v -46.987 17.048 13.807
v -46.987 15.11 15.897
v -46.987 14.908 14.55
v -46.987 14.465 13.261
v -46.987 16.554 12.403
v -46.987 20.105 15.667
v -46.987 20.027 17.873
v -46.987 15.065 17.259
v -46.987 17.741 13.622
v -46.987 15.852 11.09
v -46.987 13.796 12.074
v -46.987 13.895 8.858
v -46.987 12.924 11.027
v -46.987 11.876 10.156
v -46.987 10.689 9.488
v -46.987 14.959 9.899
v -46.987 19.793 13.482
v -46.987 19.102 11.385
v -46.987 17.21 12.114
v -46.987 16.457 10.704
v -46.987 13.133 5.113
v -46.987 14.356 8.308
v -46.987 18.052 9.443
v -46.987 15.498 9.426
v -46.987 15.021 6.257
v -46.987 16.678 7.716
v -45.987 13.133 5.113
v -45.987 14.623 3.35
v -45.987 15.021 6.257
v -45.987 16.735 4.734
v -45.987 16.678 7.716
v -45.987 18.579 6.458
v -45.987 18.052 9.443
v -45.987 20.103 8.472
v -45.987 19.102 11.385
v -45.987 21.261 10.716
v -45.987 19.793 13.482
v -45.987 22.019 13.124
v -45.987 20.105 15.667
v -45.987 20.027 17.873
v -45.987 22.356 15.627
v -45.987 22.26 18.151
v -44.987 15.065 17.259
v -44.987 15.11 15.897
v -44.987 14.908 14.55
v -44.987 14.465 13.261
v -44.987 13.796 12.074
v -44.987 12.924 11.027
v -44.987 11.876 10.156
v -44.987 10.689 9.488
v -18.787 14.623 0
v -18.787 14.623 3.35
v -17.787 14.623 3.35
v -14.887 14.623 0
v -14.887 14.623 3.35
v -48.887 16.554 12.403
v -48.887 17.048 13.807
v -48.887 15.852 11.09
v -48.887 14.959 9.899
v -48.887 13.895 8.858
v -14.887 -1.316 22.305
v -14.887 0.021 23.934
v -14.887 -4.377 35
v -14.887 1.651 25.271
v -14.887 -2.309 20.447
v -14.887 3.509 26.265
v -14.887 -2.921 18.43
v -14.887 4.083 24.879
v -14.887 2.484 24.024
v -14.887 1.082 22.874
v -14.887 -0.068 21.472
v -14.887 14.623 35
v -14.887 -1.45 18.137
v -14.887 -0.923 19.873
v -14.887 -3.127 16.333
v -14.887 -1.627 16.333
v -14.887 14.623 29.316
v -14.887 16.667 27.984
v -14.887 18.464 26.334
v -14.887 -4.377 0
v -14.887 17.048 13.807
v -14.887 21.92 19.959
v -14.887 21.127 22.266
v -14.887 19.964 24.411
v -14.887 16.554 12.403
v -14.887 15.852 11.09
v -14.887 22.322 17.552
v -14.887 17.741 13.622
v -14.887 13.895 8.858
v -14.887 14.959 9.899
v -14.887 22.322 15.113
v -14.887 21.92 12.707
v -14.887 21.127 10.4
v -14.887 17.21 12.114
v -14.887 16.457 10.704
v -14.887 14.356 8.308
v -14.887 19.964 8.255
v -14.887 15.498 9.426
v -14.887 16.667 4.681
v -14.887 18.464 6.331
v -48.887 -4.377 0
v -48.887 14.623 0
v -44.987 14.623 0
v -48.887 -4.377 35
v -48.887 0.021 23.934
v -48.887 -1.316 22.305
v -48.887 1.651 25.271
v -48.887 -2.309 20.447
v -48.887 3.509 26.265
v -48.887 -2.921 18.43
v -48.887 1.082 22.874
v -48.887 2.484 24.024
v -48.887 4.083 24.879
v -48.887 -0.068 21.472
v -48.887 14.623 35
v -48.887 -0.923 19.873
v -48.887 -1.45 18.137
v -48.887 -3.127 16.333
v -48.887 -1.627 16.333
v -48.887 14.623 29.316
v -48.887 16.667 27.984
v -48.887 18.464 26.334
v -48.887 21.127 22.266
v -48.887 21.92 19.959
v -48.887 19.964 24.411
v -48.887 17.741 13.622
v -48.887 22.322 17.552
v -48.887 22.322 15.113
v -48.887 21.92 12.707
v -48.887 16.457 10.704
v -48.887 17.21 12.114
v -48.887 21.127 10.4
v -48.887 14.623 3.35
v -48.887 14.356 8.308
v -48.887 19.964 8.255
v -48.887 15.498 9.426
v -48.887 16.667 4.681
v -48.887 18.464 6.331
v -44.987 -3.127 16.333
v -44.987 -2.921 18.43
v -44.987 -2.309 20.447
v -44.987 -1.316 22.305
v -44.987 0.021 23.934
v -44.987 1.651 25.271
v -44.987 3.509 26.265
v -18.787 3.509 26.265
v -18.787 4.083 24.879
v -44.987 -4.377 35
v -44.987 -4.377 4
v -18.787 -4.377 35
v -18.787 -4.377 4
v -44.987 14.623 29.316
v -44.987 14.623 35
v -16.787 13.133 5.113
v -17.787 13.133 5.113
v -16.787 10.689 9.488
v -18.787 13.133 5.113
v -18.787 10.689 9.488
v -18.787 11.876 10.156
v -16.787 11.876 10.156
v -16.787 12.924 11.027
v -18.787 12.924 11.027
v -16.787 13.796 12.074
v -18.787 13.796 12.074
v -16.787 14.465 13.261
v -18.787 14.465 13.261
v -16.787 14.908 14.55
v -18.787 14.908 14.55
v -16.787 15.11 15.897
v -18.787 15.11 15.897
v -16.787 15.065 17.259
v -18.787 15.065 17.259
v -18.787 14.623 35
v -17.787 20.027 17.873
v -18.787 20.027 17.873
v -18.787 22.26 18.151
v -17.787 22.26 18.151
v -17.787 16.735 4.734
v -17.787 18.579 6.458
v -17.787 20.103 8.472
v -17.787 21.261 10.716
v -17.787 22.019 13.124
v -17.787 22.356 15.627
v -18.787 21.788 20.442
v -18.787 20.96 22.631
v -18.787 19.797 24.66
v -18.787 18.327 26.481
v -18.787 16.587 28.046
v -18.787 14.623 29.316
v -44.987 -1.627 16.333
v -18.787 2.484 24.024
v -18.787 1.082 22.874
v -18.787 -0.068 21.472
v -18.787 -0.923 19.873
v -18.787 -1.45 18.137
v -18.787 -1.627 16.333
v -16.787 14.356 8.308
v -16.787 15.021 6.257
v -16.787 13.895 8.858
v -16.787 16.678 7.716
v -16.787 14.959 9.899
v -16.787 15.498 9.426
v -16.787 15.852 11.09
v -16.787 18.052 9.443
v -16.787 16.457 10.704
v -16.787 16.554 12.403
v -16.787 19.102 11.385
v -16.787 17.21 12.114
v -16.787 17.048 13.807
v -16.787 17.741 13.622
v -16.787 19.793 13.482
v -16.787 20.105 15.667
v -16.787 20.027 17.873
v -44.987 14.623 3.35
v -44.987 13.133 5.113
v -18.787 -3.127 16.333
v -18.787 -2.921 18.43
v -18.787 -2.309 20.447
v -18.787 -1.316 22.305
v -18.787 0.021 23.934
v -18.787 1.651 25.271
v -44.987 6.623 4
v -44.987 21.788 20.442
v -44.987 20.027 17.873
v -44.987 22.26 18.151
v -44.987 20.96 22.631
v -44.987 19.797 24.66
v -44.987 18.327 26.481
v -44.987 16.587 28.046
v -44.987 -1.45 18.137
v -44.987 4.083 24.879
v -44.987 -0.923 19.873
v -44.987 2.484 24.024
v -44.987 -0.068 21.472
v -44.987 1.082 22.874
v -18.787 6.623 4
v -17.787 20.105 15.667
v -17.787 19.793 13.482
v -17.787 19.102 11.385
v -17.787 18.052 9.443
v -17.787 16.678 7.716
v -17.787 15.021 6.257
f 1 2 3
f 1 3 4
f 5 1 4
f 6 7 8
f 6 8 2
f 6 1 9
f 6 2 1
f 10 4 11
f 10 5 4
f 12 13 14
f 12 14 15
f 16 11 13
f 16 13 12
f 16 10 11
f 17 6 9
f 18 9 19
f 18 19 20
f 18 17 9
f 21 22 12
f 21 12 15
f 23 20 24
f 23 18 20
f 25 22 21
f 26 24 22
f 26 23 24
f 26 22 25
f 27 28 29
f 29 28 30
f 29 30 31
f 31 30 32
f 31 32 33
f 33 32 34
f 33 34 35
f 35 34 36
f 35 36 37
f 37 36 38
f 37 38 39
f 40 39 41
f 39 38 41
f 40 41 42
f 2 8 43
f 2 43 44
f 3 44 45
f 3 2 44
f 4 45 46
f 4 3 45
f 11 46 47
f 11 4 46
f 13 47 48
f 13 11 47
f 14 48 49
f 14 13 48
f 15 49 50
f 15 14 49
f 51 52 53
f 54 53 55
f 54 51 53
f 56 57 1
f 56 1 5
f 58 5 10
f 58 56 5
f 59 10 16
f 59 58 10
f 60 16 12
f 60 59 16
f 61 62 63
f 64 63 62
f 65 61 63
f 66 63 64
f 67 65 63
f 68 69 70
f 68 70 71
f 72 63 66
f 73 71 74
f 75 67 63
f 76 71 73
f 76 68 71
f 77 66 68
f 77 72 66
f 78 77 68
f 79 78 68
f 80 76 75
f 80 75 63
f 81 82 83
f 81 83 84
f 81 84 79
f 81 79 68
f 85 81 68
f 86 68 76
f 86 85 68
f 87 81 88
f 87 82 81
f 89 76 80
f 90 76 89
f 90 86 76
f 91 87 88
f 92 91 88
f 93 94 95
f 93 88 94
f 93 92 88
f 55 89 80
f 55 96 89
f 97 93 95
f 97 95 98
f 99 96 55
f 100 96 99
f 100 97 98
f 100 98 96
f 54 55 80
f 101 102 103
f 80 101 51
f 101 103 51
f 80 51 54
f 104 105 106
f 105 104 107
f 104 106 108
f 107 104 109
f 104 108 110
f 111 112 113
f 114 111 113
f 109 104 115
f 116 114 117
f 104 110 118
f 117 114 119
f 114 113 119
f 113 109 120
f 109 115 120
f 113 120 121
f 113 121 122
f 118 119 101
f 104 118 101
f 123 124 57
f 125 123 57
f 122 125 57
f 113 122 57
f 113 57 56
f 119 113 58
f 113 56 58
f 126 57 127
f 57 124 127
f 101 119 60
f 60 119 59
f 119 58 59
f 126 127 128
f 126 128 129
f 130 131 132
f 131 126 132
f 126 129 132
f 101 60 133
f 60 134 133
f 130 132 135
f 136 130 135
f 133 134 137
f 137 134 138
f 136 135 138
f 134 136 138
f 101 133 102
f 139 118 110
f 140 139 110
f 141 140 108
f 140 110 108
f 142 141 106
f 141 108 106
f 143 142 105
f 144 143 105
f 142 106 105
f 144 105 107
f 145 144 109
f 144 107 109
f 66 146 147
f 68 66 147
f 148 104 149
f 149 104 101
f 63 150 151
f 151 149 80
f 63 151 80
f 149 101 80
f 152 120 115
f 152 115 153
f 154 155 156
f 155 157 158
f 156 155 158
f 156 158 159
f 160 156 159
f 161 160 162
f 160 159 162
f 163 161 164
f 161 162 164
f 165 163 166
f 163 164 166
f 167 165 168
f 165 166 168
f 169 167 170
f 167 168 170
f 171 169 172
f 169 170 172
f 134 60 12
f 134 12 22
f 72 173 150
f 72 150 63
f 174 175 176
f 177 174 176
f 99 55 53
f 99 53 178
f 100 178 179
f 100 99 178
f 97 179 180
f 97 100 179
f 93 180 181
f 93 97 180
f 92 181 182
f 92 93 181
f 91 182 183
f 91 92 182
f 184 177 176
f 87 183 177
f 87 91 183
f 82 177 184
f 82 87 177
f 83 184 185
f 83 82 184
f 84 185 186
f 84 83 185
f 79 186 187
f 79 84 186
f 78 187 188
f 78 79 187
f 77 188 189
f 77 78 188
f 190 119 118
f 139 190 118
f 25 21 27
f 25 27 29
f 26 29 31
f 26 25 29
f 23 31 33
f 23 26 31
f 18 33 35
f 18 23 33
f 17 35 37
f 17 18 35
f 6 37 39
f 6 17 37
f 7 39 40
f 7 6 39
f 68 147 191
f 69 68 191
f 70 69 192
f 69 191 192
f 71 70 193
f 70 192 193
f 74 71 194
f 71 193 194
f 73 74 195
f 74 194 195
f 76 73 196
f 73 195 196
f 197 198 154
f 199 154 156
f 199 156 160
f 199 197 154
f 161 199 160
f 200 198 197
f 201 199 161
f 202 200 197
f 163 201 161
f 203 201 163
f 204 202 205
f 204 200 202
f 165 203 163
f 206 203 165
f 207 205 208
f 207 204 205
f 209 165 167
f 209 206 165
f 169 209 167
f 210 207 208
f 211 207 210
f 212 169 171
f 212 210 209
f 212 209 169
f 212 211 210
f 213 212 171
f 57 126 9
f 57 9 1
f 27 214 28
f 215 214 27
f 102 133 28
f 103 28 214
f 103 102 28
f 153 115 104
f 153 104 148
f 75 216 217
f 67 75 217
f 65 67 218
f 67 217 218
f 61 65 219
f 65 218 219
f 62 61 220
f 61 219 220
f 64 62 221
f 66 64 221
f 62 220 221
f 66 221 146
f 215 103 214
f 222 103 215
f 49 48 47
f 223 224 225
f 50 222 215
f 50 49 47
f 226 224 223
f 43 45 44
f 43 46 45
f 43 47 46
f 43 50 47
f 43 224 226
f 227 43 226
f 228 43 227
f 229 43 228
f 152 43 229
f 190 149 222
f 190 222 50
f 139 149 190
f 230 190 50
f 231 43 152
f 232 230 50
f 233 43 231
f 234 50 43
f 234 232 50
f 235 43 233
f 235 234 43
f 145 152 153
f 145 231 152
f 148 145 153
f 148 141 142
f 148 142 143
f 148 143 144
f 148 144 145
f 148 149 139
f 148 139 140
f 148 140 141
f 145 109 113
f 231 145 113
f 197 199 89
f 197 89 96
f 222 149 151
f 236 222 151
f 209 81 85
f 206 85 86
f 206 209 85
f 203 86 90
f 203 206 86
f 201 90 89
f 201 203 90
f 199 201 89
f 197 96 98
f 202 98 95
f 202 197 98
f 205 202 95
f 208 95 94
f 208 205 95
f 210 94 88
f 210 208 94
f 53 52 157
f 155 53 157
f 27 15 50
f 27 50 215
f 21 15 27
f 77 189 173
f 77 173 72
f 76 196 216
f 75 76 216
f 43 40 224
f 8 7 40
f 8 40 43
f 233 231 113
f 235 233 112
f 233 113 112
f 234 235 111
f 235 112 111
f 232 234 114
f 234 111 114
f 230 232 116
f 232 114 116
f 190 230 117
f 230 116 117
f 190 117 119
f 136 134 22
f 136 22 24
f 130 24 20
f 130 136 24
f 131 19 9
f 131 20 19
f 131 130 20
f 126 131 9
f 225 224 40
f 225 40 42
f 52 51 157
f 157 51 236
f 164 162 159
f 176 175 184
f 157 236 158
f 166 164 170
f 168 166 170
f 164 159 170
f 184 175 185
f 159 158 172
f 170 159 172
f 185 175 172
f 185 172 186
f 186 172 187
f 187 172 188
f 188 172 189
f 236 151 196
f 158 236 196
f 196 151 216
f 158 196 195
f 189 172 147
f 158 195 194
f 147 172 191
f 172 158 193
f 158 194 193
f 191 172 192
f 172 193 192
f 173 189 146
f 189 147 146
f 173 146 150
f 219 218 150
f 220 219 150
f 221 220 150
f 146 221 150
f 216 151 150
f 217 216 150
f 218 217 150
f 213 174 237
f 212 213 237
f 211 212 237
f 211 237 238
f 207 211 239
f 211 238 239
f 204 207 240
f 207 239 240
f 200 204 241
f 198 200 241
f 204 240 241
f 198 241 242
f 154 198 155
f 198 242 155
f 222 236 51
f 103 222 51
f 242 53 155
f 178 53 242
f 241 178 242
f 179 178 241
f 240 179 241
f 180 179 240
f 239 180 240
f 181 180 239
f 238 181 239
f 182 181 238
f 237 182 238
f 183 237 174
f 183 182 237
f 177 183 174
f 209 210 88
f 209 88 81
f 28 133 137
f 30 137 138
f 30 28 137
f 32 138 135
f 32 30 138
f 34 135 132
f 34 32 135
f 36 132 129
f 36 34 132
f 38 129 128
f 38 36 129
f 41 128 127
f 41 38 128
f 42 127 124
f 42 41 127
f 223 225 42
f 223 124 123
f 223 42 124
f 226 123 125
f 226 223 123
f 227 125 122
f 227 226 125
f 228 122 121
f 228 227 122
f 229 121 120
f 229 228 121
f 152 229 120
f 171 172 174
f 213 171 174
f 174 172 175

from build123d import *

# Parameters (mm, degrees)
CROQUIS1_W              = 34
CROQUIS1_H              = 19
SALIENTE_EXTRUIR1_DEPTH = 35
CROQUIS2_W              = 26.2
CROQUIS2_H              = 31
CORTAR_EXTRUIR1_DEPTH   = 25
CORTAR_EXTRUIR3_DEPTH   = 26.2
SALIENTE_EXTRUIR2_DEPTH = 34
CROQUIS10_W             = 26.2
CROQUIS10_H             = 25.966324345
CORTAR_EXTRUIR4_DEPTH   = 10
CORTAR_EXTRUIR5_START   = -34
CORTAR_EXTRUIR5_DEPTH   = 34
CORTAR_EXTRUIR6_DEPTH   = 2
CORTAR_EXTRUIR7_START   = 28.2
CORTAR_EXTRUIR7_DEPTH   = 28.2
CORTAR_EXTRUIR8_DEPTH   = 1
CORTAR_EXTRUIR9_DEPTH   = 27.2


with BuildPart() as part:
    # Croquis1 → Saliente-Extruir1 (new body)
    with BuildSketch(Plane.XY):
        with Locations((-31.887263086, 5.12254902)):
            Rectangle(CROQUIS1_W, CROQUIS1_H)
    extrude(amount=SALIENTE_EXTRUIR1_DEPTH)

    # Croquis2 → Cortar-Extruir1 (cut)
    with BuildSketch(Plane.XZ.offset(4.37745098)):
        with Locations((-31.887263086, 19.5)):
            Rectangle(CROQUIS2_W, CROQUIS2_H)
    extrude(amount=-CORTAR_EXTRUIR1_DEPTH, mode=Mode.SUBTRACT)

    # Croquis4 → Cortar-Extruir3 (cut)
    with BuildSketch(Plane.ZY.offset(18.787263086)):
        Polygon((4, 14.62254902), (4, 6.62254902), (0, 14.62254902), align=None)
    extrude(amount=CORTAR_EXTRUIR3_DEPTH, mode=Mode.SUBTRACT)

    # Croquis9 → Saliente-Extruir2 (add)
    with BuildSketch(Plane(origin=(-14.887263086, 0, 0), x_dir=(0, 0, -1), z_dir=(1, 0, 0))):
        with BuildLine():
            Line((-29.315831827, 14.62254902), (-3.349507482, 14.62254902))
            ThreePointArc((-3.349507482, 14.62254902), (-16.332669655, 22.37254902), (-29.315831827, 14.62254902))
        make_face()
    extrude(amount=-SALIENTE_EXTRUIR2_DEPTH)

    # Croquis10 → Cortar-Extruir4 (cut)
    with BuildSketch(Plane.XZ.offset(-14.62254902)):
        with Locations((-31.887263086, 16.332669655)):
            Rectangle(CROQUIS10_W, CROQUIS10_H)
    extrude(amount=-CORTAR_EXTRUIR4_DEPTH, mode=Mode.SUBTRACT)

    # Croquis11 → Cortar-Extruir5 (cut)
    with BuildSketch(Plane(origin=(-14.887263086, 0, 0), x_dir=(0, 0, -1), z_dir=(1, 0, 0)).offset(CORTAR_EXTRUIR5_START)):
        with BuildLine():
            Line((-26.264575199, 3.509186373), (-24.878727914, 4.083143951))
            ThreePointArc((-24.878727914, 4.083143951), (-21.471881808, -0.068419609), (-16.332669655, -1.62745098))
            Line((-16.332669655, -1.62745098), (-16.332669655, -3.12745098))
            ThreePointArc((-16.332669655, -3.12745098), (-22.305267563, -1.31560371), (-26.264575199, 3.509186373))
        make_face()
        with BuildLine():
            Line((-13.621540157, 17.74062205), (-13.807242822, 17.04757027))
            ThreePointArc((-13.807242822, 17.04757027), (-11.089968726, 15.851941052), (-8.857991001, 13.894549121))
            Line((-8.857991001, 13.894549121), (-8.308354113, 14.355749231))
            ThreePointArc((-8.308354113, 14.355749231), (-10.704456257, 16.457074414), (-13.621540157, 17.74062205))
        make_face()
    extrude(amount=CORTAR_EXTRUIR5_DEPTH, mode=Mode.SUBTRACT)

    # Croquis12 → Cortar-Extruir6 (cut)
    with BuildSketch(Plane.ZY.offset(18.787263086)):
        with BuildLine():
            Line((17.258889566, 15.065137056), (17.873210354, 20.027255157))
            ThreePointArc((17.873210354, 20.027255157), (10.39091869, 18.620075808), (5.112868034, 13.133089064))
            Line((5.112868034, 13.133089064), (9.488064371, 10.688715764))
            ThreePointArc((9.488064371, 10.688715764), (12.652304566, 14.157448622), (17.258889566, 15.065137056))
        make_face()
    extrude(amount=-CORTAR_EXTRUIR6_DEPTH, mode=Mode.SUBTRACT)

    # Croquis14 → Cortar-Extruir7 (cut)
    with BuildSketch(Plane.ZY.offset(18.787263086).offset(CORTAR_EXTRUIR7_START)):
        with BuildLine():
            Line((17.873210354, 20.027255157), (17.258889566, 15.065137056))
            ThreePointArc((17.258889566, 15.065137056), (12.652304566, 14.157448622), (9.488064371, 10.688715764))
            Line((9.488064371, 10.688715764), (5.112868034, 13.133089064))
            ThreePointArc((5.112868034, 13.133089064), (10.39091869, 18.620075808), (17.873210354, 20.027255157))
        make_face()
    extrude(amount=-CORTAR_EXTRUIR7_DEPTH, mode=Mode.SUBTRACT)

    # Croquis15 → Cortar-Extruir8 (cut)
    with BuildSketch(Plane.ZY.offset(18.787263086)):
        with BuildLine():
            Line((17.873210354, 20.027255157), (18.15050768, 22.260102262))
            ThreePointArc((18.15050768, 22.260102262), (9.568856329, 20.730307382), (3.349507482, 14.62254902))
            Line((3.349507482, 14.62254902), (5.112868034, 13.133089064))
            ThreePointArc((5.112868034, 13.133089064), (10.39091869, 18.620075808), (17.873210354, 20.027255157))
        make_face()
    extrude(amount=-CORTAR_EXTRUIR8_DEPTH, mode=Mode.SUBTRACT)

    # Croquis15<2> → Cortar-Extruir9 (cut)
    with BuildSketch(Plane.ZY.offset(18.787263086)):
        with BuildLine():
            Line((17.873210354, 20.027255157), (18.15050768, 22.260102262))
            ThreePointArc((18.15050768, 22.260102262), (9.568856329, 20.730307382), (3.349507482, 14.62254902))
            Line((3.349507482, 14.62254902), (5.112868034, 13.133089064))
            ThreePointArc((5.112868034, 13.133089064), (10.39091869, 18.620075808), (17.873210354, 20.027255157))
        make_face()
    extrude(amount=CORTAR_EXTRUIR9_DEPTH, mode=Mode.SUBTRACT)


solid = part.part
